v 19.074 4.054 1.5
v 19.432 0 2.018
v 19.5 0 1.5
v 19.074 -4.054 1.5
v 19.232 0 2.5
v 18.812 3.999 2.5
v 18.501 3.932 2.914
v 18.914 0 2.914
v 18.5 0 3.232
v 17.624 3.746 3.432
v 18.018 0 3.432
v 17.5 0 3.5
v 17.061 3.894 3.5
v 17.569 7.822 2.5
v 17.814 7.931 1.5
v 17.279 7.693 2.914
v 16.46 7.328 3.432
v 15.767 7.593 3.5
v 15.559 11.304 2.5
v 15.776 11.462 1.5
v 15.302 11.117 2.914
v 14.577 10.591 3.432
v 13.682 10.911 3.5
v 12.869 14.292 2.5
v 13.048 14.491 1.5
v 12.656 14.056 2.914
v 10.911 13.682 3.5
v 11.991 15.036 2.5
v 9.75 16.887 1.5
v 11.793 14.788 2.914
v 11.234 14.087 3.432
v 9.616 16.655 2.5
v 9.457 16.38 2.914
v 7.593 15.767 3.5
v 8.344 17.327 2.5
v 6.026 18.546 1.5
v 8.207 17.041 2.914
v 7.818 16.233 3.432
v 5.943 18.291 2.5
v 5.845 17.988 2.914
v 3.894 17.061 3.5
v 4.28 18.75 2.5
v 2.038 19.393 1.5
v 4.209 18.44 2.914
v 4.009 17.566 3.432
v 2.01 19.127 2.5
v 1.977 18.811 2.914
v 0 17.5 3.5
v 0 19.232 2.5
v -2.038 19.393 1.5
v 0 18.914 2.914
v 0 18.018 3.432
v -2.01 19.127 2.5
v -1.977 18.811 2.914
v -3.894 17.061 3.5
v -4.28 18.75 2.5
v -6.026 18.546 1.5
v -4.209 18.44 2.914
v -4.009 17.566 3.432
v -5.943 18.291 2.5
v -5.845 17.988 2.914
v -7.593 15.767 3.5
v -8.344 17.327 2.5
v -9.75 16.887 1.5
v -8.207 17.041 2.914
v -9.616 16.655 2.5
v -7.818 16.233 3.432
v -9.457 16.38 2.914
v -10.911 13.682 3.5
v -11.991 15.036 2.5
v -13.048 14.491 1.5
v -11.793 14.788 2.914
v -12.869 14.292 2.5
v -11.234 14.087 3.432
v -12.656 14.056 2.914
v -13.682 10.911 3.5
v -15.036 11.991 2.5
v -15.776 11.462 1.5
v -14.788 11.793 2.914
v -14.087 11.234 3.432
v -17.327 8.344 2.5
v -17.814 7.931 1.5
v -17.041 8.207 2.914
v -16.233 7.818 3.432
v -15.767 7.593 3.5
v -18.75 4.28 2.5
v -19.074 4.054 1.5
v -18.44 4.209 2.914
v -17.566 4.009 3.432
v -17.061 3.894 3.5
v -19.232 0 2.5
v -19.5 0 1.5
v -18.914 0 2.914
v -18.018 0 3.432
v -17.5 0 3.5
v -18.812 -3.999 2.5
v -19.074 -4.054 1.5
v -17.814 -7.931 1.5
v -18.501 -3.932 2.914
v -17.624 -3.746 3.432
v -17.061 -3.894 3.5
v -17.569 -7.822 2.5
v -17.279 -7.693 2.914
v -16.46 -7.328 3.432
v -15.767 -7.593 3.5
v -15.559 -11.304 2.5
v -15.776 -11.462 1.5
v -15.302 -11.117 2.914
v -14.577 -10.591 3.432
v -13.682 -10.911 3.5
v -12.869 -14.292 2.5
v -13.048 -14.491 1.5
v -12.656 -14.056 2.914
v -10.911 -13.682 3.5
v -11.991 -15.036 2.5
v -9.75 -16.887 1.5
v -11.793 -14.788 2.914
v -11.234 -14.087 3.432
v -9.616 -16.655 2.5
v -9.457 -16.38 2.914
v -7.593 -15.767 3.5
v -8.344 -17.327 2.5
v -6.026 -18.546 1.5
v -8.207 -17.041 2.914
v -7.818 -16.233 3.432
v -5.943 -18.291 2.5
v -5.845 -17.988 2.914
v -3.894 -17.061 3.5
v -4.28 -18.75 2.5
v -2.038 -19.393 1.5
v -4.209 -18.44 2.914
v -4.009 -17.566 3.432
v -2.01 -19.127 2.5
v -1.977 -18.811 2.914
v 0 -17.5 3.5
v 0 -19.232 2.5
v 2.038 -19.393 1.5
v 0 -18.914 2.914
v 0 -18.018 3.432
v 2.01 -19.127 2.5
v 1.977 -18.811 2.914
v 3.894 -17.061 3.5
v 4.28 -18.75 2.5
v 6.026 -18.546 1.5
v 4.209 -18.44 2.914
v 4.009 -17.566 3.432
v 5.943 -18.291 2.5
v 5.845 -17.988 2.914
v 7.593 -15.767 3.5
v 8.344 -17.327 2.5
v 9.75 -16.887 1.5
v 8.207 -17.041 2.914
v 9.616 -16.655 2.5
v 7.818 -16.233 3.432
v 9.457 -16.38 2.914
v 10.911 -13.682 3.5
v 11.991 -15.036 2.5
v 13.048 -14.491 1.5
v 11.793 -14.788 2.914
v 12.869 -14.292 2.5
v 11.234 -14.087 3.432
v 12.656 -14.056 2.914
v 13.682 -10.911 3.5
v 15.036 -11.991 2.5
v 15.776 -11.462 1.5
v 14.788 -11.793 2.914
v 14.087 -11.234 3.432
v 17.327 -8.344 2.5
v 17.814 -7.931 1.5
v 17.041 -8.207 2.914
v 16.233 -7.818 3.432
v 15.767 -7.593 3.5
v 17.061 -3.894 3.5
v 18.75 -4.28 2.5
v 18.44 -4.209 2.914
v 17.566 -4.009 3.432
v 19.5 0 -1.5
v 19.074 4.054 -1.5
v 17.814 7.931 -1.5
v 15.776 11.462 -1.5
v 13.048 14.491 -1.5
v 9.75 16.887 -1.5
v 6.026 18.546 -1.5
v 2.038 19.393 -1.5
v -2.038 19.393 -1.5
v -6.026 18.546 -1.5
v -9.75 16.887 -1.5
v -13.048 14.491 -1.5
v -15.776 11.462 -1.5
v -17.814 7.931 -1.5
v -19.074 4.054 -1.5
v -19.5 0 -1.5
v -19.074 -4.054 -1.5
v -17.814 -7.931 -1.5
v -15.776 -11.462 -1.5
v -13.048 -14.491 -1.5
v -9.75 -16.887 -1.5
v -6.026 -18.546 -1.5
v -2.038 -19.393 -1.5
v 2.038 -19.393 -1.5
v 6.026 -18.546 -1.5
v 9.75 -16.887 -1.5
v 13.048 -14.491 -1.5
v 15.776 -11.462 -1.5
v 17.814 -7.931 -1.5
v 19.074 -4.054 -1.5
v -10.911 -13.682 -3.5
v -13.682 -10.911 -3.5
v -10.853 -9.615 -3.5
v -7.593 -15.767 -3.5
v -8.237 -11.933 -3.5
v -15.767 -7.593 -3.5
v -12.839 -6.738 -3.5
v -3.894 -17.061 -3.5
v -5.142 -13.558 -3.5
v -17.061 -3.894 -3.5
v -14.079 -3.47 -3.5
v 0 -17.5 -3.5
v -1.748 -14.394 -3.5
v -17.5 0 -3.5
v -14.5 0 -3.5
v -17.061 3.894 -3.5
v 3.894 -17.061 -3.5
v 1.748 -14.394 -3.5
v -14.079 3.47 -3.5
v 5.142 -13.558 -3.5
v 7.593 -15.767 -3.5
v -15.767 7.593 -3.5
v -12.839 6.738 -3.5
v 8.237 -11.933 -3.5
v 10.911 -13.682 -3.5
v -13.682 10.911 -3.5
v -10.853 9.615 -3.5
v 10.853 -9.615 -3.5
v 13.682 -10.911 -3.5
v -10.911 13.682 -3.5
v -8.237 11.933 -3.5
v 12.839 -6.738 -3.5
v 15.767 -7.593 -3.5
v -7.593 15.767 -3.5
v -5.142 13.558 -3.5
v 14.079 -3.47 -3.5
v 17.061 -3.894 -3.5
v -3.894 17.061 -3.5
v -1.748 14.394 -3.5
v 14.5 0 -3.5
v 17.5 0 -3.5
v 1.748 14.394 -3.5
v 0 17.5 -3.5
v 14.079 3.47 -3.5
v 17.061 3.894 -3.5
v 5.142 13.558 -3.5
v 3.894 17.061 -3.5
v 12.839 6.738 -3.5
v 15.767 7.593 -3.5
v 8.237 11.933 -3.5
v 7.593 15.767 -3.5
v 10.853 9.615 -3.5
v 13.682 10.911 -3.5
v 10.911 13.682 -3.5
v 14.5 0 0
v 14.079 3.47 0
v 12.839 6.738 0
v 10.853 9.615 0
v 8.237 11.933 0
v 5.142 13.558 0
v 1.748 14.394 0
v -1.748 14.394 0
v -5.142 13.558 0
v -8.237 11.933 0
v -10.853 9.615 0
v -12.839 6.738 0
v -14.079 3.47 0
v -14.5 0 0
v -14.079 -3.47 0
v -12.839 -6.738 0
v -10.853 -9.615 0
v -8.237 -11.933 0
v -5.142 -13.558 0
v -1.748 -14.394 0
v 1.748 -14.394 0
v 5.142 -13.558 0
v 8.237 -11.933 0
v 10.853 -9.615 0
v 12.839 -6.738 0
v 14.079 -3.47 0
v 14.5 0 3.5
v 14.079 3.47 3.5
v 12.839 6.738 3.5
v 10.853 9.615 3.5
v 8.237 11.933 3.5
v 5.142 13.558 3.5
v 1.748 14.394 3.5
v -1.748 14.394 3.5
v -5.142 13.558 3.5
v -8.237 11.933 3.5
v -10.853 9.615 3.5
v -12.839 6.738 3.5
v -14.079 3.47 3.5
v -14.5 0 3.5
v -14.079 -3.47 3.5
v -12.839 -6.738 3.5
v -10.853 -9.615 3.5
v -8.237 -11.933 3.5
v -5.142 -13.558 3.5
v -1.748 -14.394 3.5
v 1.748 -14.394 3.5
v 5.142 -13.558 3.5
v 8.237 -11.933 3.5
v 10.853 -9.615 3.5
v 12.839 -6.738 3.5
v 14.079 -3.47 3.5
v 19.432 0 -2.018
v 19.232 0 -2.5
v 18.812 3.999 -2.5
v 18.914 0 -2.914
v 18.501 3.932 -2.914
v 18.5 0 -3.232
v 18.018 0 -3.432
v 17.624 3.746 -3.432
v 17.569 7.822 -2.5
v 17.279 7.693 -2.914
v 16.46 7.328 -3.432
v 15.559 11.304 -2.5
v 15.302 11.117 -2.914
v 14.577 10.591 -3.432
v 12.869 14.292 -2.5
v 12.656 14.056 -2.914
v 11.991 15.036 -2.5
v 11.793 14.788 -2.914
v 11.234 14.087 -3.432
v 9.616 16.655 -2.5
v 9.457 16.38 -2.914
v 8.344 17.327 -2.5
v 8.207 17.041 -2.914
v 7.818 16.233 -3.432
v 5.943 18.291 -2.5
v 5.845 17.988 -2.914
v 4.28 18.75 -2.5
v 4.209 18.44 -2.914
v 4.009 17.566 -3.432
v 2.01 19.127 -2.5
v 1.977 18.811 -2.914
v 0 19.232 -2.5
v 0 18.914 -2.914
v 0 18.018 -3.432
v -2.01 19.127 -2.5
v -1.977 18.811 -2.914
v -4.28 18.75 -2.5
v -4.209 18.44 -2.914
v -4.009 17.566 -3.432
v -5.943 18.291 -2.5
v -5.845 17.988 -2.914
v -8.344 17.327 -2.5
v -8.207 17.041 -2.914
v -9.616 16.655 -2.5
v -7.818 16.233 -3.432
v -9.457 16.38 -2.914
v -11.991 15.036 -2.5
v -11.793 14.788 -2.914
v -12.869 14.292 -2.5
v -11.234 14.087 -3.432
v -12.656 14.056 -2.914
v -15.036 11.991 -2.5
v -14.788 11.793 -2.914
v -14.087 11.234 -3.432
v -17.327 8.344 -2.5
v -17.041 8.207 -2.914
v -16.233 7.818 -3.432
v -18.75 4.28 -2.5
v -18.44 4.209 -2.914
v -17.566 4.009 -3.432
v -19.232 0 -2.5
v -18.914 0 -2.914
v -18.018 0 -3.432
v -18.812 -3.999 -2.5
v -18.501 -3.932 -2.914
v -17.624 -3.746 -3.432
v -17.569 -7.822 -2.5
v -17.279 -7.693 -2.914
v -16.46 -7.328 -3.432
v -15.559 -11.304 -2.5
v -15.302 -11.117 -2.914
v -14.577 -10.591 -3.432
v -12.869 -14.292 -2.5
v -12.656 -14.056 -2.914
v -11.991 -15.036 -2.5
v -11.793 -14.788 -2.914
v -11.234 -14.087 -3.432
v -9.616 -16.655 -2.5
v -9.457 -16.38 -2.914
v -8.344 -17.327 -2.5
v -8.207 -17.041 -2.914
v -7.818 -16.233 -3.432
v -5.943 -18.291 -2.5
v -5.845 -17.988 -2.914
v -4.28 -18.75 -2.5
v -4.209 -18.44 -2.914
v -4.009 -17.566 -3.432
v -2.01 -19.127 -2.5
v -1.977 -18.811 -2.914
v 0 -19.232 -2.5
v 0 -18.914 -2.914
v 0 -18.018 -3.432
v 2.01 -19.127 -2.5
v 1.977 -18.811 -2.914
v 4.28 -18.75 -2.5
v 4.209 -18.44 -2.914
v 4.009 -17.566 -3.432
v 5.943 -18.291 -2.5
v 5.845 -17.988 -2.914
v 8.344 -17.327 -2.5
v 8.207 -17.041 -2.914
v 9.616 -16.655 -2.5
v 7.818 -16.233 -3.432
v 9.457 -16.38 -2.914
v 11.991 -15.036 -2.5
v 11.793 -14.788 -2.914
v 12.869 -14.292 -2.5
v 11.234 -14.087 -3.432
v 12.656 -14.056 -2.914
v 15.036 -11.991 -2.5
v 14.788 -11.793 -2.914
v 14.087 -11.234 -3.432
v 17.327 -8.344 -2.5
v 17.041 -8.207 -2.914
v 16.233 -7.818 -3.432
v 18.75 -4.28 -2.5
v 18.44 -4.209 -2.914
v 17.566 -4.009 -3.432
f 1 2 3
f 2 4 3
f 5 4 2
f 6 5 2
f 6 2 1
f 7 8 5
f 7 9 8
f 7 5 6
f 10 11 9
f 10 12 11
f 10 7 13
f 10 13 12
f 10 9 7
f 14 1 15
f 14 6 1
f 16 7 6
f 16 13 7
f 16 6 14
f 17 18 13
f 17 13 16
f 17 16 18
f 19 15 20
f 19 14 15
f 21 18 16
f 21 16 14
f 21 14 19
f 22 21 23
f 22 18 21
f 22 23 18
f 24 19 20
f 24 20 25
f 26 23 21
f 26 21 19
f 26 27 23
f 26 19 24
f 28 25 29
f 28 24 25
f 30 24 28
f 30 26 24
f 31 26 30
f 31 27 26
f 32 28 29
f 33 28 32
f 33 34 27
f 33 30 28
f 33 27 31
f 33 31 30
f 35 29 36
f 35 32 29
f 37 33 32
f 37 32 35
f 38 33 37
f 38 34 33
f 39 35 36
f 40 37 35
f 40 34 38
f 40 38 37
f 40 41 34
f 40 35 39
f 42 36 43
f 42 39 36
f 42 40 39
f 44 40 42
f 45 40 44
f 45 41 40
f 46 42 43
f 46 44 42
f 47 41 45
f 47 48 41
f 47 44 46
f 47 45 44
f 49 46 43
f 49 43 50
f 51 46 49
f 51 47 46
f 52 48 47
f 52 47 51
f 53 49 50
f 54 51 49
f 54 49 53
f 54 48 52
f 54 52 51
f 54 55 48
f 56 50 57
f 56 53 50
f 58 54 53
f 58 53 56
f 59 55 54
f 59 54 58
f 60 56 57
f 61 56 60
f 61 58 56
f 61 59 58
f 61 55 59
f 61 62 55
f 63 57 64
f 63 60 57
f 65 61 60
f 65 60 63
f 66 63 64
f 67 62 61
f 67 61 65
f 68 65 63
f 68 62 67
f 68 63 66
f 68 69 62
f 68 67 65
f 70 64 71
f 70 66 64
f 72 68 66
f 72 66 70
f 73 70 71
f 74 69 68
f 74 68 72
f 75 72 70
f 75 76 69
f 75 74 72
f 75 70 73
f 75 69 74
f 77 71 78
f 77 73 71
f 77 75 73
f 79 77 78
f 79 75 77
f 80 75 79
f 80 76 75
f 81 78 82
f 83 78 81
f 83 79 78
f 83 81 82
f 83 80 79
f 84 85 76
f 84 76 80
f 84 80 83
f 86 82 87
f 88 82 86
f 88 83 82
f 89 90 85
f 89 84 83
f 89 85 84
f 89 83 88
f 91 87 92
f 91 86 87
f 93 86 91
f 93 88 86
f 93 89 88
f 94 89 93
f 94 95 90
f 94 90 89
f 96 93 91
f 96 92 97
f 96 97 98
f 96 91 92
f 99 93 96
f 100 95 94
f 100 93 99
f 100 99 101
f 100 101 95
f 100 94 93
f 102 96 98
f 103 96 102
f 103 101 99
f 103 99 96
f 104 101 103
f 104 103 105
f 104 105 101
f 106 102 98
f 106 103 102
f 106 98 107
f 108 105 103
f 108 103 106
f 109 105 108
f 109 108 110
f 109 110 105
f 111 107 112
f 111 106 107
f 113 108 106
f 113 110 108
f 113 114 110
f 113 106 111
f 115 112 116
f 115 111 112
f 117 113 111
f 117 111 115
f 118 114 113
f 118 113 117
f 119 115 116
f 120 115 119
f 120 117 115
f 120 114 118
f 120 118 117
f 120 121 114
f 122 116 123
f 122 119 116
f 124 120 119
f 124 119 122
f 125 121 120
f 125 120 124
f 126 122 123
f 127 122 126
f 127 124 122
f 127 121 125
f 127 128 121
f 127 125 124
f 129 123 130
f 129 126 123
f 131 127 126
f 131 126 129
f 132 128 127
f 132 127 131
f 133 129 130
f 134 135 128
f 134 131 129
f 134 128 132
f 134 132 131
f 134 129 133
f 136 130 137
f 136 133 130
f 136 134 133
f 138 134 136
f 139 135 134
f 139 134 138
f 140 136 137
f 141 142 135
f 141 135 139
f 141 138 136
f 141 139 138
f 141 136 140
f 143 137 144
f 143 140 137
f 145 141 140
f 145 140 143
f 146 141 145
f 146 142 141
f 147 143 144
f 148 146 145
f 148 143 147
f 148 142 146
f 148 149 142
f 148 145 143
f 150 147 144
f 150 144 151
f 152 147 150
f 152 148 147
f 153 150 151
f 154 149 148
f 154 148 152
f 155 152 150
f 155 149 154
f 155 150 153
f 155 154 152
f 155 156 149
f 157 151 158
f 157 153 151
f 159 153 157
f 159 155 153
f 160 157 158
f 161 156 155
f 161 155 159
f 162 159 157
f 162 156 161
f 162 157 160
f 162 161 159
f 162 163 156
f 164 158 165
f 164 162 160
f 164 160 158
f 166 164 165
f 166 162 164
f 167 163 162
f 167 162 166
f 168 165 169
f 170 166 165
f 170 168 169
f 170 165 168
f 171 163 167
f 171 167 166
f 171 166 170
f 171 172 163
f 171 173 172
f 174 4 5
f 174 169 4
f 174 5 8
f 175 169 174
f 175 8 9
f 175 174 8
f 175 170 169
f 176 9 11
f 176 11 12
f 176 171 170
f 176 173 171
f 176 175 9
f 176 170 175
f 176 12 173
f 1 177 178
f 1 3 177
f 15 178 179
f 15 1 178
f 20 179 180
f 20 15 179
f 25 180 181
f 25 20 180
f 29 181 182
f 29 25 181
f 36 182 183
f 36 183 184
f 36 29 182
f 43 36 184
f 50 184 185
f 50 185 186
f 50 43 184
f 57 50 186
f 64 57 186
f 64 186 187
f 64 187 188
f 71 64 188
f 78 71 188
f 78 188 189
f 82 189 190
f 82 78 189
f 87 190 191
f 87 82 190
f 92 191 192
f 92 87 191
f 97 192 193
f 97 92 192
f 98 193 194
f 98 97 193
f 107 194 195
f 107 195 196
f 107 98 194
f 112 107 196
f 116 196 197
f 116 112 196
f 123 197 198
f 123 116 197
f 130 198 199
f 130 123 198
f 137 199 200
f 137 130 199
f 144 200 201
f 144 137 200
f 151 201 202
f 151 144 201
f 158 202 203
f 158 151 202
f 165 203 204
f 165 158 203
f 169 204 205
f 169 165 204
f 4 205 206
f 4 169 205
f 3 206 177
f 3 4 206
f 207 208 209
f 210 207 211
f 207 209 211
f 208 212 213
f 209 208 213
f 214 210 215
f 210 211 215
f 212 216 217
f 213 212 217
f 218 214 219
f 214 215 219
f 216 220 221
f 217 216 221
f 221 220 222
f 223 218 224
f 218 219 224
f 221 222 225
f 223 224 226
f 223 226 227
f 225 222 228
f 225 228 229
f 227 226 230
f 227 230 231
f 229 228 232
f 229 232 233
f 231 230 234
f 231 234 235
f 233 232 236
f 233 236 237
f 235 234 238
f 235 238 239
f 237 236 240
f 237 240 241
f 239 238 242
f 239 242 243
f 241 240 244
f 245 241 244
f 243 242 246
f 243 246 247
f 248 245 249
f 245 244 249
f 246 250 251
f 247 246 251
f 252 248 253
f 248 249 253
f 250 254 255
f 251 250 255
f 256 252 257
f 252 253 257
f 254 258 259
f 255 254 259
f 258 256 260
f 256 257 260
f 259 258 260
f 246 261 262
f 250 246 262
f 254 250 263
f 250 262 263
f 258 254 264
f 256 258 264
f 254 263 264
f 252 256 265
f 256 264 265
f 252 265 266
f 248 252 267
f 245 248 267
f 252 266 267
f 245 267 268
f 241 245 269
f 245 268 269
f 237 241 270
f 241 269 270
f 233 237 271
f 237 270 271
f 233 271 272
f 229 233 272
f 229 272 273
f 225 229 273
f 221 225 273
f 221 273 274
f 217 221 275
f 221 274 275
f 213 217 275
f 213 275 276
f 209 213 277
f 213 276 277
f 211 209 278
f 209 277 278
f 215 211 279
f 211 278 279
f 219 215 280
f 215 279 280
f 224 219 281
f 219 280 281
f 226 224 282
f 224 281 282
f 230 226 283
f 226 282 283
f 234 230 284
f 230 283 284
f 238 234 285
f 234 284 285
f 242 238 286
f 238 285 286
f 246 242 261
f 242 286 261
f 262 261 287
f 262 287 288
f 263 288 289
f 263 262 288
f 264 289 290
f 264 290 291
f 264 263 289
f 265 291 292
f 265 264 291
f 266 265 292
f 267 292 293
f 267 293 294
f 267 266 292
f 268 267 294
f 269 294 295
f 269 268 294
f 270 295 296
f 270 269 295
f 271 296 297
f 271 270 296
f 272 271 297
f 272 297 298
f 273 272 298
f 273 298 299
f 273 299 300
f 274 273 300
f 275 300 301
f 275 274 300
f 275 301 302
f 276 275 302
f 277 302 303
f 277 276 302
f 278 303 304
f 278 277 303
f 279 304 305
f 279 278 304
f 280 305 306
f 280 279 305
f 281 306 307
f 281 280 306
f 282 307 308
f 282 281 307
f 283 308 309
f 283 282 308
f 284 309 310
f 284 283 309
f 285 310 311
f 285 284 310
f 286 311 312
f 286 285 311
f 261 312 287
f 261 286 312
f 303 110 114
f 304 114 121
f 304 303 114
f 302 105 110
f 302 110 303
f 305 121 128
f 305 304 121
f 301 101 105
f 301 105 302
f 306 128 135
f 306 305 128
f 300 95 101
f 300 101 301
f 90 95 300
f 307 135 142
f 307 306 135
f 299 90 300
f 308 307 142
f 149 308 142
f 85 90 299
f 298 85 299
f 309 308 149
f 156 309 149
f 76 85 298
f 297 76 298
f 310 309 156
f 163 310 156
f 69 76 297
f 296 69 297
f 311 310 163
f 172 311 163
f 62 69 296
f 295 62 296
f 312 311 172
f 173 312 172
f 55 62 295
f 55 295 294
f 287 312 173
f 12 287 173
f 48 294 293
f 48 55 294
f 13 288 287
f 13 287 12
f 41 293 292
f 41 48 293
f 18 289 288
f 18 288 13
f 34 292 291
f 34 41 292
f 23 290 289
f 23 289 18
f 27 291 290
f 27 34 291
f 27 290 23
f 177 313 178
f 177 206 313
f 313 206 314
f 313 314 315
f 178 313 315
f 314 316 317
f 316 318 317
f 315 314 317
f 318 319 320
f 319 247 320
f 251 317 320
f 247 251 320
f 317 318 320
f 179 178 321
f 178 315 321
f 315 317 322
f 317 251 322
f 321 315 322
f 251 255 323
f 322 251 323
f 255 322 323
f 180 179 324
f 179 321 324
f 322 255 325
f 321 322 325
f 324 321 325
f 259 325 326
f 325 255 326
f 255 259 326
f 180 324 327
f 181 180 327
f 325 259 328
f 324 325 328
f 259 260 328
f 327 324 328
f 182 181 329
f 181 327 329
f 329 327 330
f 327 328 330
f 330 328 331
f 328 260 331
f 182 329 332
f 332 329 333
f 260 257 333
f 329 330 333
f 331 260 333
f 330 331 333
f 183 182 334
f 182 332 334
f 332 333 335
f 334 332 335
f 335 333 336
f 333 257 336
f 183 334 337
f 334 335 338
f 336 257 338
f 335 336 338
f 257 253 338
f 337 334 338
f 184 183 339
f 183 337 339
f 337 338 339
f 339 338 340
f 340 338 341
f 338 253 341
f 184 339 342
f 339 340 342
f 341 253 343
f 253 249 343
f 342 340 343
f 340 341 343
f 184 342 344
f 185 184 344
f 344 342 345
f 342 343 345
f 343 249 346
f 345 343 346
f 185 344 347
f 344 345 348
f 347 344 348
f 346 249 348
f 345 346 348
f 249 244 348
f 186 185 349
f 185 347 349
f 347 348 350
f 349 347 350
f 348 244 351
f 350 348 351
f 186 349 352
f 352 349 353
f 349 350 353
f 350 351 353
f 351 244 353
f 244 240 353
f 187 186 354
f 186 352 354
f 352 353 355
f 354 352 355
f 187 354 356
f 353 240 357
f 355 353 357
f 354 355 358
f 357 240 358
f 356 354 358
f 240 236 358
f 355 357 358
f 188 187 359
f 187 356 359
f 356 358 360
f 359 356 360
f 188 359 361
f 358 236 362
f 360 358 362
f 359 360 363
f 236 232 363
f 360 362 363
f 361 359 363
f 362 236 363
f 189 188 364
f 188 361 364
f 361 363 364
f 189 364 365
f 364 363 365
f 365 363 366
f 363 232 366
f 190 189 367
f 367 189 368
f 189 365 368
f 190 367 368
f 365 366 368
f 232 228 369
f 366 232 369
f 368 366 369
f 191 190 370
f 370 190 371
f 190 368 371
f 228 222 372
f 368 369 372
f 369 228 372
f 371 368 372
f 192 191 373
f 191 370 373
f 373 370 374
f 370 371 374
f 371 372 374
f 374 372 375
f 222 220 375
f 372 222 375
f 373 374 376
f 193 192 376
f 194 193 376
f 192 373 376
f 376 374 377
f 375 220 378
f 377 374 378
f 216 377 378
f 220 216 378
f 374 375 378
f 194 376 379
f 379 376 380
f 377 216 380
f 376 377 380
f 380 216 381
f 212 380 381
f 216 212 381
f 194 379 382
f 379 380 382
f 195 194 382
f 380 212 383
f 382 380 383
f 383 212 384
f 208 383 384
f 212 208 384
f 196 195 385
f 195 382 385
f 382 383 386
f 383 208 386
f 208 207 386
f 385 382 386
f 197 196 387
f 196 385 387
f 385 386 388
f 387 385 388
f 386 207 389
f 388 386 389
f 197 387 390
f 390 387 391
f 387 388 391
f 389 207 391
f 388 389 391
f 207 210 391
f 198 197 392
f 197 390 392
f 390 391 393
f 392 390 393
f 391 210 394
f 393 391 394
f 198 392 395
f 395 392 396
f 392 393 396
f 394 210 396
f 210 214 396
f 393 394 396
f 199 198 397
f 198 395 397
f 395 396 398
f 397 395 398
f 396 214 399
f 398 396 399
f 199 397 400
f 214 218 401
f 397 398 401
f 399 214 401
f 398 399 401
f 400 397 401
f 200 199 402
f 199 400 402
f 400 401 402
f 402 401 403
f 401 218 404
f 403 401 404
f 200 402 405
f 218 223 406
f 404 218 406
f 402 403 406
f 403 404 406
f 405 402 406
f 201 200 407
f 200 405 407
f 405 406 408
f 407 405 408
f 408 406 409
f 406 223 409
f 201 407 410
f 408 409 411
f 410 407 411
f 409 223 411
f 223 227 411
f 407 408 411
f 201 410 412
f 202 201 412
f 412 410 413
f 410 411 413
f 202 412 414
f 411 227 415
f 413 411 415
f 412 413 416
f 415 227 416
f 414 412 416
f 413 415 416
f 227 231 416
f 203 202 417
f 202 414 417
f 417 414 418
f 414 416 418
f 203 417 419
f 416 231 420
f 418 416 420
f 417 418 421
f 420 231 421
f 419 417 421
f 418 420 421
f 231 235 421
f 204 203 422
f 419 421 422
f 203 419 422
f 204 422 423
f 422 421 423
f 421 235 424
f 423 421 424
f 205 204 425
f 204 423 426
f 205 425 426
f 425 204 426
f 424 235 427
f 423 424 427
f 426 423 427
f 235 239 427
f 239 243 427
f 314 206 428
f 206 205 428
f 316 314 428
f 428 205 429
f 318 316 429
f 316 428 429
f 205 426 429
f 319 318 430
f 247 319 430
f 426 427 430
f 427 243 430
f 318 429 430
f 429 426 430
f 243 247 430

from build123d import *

# Parameters (mm, degrees)
F0_R     = 19.5
F0_R_2   = 14.5
F1_DEPTH = 3.5
F2_R     = 2


with BuildPart() as f1:
    # F0 (on Top) → F1 (new body)
    with BuildSketch(Plane.XY):
        Circle(F0_R)
        Circle(F0_R_2, mode=Mode.SUBTRACT)
    extrude(amount=F1_DEPTH)

    # F2
    f2_edges = [f1.edges().sort_by_distance(p)[0] for p in [
        (-19.5, 0, 3.5),
    ]]
    fillet(f2_edges, radius=F2_R)

    # F3: F1 across plane


with BuildPart() as f1_1:
    add(f1.part)
    add(f1.part.mirror(Plane.XY))


solid = f1_1.part
